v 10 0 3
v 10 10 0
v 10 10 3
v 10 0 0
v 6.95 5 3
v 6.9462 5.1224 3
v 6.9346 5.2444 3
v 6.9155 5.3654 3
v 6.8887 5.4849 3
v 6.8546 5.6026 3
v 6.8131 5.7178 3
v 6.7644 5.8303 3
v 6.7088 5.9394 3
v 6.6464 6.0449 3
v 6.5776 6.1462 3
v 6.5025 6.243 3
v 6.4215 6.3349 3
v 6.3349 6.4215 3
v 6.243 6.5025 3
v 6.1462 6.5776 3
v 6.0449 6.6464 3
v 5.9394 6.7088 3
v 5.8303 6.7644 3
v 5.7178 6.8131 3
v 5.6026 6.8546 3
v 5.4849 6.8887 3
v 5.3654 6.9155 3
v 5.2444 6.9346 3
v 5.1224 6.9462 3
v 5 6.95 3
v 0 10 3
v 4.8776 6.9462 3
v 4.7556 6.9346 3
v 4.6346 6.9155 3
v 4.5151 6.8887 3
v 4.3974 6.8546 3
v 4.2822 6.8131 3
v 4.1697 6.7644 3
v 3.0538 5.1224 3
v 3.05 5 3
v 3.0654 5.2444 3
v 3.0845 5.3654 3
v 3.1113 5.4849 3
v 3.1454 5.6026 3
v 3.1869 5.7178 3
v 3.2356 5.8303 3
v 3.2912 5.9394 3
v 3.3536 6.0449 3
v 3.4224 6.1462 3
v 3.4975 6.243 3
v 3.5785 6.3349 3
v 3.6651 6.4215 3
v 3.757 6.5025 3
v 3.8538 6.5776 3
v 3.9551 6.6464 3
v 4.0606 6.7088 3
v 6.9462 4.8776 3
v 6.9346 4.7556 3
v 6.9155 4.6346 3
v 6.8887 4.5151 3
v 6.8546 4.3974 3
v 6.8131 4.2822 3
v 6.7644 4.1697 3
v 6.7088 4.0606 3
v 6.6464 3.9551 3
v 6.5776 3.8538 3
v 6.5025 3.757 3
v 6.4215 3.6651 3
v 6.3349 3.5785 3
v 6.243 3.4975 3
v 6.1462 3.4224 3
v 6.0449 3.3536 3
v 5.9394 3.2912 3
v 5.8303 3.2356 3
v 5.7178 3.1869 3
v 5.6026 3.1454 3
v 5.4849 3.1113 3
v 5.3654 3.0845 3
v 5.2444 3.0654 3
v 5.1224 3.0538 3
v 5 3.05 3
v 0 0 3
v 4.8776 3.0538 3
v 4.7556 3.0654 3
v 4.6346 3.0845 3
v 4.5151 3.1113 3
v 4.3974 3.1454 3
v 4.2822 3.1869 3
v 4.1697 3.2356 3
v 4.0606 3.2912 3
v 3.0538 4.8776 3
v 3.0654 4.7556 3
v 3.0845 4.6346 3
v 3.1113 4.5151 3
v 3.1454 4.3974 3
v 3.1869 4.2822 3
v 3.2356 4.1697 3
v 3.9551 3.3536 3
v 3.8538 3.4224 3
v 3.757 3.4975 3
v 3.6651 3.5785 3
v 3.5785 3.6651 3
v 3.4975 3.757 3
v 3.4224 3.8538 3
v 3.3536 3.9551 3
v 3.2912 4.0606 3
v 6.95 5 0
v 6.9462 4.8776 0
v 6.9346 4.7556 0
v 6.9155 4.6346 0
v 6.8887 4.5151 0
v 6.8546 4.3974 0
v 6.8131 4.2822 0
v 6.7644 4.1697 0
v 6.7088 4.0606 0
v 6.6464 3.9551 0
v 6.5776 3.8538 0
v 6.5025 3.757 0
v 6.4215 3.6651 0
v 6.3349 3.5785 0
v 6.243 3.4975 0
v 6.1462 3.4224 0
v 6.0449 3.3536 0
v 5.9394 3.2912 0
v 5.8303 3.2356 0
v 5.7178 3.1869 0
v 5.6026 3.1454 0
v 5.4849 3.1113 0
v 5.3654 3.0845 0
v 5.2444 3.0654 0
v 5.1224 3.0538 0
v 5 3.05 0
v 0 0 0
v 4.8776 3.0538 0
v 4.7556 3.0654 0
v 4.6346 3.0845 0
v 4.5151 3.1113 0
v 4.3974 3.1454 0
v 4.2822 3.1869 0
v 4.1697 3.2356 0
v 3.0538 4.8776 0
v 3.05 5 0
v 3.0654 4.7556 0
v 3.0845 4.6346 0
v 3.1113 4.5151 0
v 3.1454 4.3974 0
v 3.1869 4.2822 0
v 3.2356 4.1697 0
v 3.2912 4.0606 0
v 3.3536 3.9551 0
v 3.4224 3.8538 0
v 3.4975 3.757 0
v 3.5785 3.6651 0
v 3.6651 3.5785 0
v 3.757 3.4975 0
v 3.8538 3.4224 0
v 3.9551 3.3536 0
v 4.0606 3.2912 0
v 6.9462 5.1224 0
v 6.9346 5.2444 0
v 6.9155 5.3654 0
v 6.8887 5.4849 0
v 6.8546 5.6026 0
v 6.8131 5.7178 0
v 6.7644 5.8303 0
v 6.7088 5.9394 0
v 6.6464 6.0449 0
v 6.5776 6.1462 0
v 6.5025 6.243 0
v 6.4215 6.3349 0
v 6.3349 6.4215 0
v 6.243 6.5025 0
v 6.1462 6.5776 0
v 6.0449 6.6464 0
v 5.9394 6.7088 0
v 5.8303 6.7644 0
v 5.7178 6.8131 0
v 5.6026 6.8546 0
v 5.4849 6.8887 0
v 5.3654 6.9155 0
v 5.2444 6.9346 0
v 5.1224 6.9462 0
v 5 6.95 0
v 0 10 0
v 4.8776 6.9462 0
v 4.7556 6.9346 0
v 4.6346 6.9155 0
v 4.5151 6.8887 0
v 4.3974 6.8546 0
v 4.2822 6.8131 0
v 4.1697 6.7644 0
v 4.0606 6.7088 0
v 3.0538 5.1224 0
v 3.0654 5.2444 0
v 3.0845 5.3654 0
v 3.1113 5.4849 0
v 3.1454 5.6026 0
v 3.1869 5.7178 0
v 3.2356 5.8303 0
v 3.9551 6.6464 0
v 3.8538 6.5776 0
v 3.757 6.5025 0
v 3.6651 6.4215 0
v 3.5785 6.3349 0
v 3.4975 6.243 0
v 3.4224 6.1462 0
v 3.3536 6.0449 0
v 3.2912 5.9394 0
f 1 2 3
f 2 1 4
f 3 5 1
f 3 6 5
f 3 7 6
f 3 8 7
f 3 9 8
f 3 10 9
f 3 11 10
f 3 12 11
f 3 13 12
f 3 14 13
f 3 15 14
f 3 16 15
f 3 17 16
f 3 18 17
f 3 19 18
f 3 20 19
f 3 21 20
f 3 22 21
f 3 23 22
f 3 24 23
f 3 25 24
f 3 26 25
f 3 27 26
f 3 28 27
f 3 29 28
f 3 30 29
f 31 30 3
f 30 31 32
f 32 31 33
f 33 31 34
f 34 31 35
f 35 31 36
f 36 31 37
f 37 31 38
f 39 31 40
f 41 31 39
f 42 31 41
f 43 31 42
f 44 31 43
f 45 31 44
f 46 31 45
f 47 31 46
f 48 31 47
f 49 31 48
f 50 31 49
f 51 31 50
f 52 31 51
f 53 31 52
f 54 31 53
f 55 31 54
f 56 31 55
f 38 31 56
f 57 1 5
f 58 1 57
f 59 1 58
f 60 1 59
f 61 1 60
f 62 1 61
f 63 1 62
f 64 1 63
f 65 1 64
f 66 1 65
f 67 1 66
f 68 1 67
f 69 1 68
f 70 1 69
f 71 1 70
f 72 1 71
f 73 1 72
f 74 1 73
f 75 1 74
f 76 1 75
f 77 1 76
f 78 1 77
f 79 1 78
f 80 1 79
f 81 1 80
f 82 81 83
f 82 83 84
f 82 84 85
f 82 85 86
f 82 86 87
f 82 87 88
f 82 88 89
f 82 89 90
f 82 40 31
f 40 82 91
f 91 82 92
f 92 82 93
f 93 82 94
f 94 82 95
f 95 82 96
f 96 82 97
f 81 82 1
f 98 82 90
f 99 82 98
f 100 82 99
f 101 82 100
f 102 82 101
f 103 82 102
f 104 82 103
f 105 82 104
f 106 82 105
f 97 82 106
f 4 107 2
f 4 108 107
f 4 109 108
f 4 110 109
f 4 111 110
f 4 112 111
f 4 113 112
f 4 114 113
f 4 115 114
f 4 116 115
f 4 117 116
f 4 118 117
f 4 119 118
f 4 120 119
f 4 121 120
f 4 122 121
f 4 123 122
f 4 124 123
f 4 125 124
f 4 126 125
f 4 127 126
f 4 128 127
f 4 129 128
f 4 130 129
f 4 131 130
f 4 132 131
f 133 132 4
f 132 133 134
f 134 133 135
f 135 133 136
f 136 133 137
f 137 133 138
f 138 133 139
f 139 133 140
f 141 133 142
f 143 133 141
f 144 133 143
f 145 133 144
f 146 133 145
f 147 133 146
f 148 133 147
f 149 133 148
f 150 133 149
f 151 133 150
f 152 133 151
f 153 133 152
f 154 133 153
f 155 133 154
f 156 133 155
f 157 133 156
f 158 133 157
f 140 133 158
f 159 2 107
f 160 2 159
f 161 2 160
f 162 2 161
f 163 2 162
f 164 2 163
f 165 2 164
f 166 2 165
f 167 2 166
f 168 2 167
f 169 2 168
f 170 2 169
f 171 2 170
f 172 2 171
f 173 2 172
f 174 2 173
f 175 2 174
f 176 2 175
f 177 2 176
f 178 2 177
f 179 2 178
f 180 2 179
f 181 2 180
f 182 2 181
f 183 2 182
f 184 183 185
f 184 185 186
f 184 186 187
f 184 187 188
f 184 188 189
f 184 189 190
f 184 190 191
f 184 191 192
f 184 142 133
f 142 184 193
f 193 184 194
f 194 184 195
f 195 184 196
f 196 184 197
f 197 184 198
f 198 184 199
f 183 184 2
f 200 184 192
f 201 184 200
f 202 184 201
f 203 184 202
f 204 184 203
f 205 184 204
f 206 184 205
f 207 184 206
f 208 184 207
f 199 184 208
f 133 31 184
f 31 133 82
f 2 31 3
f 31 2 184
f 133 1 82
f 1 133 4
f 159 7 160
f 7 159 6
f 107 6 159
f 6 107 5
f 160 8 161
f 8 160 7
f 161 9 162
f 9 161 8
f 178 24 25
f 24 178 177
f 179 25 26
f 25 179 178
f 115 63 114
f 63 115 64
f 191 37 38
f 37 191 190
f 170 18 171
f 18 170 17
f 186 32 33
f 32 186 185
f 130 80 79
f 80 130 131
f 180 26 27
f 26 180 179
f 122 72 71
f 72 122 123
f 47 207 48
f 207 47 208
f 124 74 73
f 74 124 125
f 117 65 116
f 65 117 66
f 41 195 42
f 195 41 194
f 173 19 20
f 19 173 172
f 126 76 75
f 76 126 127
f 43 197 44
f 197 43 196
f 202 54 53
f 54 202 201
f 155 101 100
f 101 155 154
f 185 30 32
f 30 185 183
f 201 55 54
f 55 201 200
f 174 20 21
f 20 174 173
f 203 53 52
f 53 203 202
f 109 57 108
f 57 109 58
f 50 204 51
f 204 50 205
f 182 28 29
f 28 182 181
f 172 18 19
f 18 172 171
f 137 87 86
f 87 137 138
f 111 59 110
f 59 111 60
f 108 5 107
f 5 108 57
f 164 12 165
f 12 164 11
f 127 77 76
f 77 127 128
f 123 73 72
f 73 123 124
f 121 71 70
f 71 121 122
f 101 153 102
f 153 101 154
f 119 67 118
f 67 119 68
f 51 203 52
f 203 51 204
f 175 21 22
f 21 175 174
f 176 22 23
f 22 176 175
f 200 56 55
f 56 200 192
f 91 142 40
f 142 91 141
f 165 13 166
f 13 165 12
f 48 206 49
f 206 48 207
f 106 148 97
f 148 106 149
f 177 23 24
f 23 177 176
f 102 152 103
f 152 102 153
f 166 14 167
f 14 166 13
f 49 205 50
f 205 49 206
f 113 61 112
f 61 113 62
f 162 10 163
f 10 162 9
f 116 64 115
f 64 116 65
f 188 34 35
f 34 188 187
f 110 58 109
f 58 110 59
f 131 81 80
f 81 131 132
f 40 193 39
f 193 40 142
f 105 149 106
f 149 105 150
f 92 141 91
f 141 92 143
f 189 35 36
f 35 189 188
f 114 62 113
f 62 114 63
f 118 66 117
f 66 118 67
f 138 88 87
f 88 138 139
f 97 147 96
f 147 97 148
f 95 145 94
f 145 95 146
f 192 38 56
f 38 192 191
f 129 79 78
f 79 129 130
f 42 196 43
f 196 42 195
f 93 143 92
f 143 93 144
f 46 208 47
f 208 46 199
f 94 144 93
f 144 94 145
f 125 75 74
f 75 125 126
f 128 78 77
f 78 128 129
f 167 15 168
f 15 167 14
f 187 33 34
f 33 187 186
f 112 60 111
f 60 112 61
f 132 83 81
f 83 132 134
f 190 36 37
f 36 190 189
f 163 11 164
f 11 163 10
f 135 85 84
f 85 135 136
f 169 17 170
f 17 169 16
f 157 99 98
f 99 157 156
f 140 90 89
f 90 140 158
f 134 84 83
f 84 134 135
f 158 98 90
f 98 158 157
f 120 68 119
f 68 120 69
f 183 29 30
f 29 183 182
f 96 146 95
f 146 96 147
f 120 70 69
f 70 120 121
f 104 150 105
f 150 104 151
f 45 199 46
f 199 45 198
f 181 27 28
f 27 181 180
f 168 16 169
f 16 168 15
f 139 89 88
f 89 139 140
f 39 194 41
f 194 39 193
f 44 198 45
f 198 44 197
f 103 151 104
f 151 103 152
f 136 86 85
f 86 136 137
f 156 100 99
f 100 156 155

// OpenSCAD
// file: Holes.scad
$fn = 100;
high_of_hole = 1;

//hole_for_base (high_of_hole);
//hole_for_screw_M2 (high_of_hole);
//hole_for_screw_M2_5 (high_of_hole);
//hole_for_screw_M3 (high_of_hole);
//hole_for_shaft (high_of_hole);

module hole_for_base (high_of_hole) {
    cylinder (h = high_of_hole, d = 8);
}

module hole_for_screw_M1_2 (high_of_hole) {
    cylinder (h = high_of_hole, d = 1.6);
}

module hole_for_screw_M2 (high_of_hole) {
    cylinder (h = high_of_hole, d = 2.8);
}

module hole_for_screw_M2_5 (high_of_hole) {
    cylinder (h = high_of_hole, d = 3.3);
}

module hole_for_screw_M3 (high_of_hole) {
    cylinder (h = high_of_hole, d = 3.9);
}

module hole_for_shaft (high_of_hole) {
    cylinder (h = high_of_hole, d = 4.9);
}
// main file
use <Holes.scad>;

difference () {
    cube ([10, 10, 3]);
    translate ([5, 5, -0.5]) {
        hole_for_screw_M3 (4);
    }
}
